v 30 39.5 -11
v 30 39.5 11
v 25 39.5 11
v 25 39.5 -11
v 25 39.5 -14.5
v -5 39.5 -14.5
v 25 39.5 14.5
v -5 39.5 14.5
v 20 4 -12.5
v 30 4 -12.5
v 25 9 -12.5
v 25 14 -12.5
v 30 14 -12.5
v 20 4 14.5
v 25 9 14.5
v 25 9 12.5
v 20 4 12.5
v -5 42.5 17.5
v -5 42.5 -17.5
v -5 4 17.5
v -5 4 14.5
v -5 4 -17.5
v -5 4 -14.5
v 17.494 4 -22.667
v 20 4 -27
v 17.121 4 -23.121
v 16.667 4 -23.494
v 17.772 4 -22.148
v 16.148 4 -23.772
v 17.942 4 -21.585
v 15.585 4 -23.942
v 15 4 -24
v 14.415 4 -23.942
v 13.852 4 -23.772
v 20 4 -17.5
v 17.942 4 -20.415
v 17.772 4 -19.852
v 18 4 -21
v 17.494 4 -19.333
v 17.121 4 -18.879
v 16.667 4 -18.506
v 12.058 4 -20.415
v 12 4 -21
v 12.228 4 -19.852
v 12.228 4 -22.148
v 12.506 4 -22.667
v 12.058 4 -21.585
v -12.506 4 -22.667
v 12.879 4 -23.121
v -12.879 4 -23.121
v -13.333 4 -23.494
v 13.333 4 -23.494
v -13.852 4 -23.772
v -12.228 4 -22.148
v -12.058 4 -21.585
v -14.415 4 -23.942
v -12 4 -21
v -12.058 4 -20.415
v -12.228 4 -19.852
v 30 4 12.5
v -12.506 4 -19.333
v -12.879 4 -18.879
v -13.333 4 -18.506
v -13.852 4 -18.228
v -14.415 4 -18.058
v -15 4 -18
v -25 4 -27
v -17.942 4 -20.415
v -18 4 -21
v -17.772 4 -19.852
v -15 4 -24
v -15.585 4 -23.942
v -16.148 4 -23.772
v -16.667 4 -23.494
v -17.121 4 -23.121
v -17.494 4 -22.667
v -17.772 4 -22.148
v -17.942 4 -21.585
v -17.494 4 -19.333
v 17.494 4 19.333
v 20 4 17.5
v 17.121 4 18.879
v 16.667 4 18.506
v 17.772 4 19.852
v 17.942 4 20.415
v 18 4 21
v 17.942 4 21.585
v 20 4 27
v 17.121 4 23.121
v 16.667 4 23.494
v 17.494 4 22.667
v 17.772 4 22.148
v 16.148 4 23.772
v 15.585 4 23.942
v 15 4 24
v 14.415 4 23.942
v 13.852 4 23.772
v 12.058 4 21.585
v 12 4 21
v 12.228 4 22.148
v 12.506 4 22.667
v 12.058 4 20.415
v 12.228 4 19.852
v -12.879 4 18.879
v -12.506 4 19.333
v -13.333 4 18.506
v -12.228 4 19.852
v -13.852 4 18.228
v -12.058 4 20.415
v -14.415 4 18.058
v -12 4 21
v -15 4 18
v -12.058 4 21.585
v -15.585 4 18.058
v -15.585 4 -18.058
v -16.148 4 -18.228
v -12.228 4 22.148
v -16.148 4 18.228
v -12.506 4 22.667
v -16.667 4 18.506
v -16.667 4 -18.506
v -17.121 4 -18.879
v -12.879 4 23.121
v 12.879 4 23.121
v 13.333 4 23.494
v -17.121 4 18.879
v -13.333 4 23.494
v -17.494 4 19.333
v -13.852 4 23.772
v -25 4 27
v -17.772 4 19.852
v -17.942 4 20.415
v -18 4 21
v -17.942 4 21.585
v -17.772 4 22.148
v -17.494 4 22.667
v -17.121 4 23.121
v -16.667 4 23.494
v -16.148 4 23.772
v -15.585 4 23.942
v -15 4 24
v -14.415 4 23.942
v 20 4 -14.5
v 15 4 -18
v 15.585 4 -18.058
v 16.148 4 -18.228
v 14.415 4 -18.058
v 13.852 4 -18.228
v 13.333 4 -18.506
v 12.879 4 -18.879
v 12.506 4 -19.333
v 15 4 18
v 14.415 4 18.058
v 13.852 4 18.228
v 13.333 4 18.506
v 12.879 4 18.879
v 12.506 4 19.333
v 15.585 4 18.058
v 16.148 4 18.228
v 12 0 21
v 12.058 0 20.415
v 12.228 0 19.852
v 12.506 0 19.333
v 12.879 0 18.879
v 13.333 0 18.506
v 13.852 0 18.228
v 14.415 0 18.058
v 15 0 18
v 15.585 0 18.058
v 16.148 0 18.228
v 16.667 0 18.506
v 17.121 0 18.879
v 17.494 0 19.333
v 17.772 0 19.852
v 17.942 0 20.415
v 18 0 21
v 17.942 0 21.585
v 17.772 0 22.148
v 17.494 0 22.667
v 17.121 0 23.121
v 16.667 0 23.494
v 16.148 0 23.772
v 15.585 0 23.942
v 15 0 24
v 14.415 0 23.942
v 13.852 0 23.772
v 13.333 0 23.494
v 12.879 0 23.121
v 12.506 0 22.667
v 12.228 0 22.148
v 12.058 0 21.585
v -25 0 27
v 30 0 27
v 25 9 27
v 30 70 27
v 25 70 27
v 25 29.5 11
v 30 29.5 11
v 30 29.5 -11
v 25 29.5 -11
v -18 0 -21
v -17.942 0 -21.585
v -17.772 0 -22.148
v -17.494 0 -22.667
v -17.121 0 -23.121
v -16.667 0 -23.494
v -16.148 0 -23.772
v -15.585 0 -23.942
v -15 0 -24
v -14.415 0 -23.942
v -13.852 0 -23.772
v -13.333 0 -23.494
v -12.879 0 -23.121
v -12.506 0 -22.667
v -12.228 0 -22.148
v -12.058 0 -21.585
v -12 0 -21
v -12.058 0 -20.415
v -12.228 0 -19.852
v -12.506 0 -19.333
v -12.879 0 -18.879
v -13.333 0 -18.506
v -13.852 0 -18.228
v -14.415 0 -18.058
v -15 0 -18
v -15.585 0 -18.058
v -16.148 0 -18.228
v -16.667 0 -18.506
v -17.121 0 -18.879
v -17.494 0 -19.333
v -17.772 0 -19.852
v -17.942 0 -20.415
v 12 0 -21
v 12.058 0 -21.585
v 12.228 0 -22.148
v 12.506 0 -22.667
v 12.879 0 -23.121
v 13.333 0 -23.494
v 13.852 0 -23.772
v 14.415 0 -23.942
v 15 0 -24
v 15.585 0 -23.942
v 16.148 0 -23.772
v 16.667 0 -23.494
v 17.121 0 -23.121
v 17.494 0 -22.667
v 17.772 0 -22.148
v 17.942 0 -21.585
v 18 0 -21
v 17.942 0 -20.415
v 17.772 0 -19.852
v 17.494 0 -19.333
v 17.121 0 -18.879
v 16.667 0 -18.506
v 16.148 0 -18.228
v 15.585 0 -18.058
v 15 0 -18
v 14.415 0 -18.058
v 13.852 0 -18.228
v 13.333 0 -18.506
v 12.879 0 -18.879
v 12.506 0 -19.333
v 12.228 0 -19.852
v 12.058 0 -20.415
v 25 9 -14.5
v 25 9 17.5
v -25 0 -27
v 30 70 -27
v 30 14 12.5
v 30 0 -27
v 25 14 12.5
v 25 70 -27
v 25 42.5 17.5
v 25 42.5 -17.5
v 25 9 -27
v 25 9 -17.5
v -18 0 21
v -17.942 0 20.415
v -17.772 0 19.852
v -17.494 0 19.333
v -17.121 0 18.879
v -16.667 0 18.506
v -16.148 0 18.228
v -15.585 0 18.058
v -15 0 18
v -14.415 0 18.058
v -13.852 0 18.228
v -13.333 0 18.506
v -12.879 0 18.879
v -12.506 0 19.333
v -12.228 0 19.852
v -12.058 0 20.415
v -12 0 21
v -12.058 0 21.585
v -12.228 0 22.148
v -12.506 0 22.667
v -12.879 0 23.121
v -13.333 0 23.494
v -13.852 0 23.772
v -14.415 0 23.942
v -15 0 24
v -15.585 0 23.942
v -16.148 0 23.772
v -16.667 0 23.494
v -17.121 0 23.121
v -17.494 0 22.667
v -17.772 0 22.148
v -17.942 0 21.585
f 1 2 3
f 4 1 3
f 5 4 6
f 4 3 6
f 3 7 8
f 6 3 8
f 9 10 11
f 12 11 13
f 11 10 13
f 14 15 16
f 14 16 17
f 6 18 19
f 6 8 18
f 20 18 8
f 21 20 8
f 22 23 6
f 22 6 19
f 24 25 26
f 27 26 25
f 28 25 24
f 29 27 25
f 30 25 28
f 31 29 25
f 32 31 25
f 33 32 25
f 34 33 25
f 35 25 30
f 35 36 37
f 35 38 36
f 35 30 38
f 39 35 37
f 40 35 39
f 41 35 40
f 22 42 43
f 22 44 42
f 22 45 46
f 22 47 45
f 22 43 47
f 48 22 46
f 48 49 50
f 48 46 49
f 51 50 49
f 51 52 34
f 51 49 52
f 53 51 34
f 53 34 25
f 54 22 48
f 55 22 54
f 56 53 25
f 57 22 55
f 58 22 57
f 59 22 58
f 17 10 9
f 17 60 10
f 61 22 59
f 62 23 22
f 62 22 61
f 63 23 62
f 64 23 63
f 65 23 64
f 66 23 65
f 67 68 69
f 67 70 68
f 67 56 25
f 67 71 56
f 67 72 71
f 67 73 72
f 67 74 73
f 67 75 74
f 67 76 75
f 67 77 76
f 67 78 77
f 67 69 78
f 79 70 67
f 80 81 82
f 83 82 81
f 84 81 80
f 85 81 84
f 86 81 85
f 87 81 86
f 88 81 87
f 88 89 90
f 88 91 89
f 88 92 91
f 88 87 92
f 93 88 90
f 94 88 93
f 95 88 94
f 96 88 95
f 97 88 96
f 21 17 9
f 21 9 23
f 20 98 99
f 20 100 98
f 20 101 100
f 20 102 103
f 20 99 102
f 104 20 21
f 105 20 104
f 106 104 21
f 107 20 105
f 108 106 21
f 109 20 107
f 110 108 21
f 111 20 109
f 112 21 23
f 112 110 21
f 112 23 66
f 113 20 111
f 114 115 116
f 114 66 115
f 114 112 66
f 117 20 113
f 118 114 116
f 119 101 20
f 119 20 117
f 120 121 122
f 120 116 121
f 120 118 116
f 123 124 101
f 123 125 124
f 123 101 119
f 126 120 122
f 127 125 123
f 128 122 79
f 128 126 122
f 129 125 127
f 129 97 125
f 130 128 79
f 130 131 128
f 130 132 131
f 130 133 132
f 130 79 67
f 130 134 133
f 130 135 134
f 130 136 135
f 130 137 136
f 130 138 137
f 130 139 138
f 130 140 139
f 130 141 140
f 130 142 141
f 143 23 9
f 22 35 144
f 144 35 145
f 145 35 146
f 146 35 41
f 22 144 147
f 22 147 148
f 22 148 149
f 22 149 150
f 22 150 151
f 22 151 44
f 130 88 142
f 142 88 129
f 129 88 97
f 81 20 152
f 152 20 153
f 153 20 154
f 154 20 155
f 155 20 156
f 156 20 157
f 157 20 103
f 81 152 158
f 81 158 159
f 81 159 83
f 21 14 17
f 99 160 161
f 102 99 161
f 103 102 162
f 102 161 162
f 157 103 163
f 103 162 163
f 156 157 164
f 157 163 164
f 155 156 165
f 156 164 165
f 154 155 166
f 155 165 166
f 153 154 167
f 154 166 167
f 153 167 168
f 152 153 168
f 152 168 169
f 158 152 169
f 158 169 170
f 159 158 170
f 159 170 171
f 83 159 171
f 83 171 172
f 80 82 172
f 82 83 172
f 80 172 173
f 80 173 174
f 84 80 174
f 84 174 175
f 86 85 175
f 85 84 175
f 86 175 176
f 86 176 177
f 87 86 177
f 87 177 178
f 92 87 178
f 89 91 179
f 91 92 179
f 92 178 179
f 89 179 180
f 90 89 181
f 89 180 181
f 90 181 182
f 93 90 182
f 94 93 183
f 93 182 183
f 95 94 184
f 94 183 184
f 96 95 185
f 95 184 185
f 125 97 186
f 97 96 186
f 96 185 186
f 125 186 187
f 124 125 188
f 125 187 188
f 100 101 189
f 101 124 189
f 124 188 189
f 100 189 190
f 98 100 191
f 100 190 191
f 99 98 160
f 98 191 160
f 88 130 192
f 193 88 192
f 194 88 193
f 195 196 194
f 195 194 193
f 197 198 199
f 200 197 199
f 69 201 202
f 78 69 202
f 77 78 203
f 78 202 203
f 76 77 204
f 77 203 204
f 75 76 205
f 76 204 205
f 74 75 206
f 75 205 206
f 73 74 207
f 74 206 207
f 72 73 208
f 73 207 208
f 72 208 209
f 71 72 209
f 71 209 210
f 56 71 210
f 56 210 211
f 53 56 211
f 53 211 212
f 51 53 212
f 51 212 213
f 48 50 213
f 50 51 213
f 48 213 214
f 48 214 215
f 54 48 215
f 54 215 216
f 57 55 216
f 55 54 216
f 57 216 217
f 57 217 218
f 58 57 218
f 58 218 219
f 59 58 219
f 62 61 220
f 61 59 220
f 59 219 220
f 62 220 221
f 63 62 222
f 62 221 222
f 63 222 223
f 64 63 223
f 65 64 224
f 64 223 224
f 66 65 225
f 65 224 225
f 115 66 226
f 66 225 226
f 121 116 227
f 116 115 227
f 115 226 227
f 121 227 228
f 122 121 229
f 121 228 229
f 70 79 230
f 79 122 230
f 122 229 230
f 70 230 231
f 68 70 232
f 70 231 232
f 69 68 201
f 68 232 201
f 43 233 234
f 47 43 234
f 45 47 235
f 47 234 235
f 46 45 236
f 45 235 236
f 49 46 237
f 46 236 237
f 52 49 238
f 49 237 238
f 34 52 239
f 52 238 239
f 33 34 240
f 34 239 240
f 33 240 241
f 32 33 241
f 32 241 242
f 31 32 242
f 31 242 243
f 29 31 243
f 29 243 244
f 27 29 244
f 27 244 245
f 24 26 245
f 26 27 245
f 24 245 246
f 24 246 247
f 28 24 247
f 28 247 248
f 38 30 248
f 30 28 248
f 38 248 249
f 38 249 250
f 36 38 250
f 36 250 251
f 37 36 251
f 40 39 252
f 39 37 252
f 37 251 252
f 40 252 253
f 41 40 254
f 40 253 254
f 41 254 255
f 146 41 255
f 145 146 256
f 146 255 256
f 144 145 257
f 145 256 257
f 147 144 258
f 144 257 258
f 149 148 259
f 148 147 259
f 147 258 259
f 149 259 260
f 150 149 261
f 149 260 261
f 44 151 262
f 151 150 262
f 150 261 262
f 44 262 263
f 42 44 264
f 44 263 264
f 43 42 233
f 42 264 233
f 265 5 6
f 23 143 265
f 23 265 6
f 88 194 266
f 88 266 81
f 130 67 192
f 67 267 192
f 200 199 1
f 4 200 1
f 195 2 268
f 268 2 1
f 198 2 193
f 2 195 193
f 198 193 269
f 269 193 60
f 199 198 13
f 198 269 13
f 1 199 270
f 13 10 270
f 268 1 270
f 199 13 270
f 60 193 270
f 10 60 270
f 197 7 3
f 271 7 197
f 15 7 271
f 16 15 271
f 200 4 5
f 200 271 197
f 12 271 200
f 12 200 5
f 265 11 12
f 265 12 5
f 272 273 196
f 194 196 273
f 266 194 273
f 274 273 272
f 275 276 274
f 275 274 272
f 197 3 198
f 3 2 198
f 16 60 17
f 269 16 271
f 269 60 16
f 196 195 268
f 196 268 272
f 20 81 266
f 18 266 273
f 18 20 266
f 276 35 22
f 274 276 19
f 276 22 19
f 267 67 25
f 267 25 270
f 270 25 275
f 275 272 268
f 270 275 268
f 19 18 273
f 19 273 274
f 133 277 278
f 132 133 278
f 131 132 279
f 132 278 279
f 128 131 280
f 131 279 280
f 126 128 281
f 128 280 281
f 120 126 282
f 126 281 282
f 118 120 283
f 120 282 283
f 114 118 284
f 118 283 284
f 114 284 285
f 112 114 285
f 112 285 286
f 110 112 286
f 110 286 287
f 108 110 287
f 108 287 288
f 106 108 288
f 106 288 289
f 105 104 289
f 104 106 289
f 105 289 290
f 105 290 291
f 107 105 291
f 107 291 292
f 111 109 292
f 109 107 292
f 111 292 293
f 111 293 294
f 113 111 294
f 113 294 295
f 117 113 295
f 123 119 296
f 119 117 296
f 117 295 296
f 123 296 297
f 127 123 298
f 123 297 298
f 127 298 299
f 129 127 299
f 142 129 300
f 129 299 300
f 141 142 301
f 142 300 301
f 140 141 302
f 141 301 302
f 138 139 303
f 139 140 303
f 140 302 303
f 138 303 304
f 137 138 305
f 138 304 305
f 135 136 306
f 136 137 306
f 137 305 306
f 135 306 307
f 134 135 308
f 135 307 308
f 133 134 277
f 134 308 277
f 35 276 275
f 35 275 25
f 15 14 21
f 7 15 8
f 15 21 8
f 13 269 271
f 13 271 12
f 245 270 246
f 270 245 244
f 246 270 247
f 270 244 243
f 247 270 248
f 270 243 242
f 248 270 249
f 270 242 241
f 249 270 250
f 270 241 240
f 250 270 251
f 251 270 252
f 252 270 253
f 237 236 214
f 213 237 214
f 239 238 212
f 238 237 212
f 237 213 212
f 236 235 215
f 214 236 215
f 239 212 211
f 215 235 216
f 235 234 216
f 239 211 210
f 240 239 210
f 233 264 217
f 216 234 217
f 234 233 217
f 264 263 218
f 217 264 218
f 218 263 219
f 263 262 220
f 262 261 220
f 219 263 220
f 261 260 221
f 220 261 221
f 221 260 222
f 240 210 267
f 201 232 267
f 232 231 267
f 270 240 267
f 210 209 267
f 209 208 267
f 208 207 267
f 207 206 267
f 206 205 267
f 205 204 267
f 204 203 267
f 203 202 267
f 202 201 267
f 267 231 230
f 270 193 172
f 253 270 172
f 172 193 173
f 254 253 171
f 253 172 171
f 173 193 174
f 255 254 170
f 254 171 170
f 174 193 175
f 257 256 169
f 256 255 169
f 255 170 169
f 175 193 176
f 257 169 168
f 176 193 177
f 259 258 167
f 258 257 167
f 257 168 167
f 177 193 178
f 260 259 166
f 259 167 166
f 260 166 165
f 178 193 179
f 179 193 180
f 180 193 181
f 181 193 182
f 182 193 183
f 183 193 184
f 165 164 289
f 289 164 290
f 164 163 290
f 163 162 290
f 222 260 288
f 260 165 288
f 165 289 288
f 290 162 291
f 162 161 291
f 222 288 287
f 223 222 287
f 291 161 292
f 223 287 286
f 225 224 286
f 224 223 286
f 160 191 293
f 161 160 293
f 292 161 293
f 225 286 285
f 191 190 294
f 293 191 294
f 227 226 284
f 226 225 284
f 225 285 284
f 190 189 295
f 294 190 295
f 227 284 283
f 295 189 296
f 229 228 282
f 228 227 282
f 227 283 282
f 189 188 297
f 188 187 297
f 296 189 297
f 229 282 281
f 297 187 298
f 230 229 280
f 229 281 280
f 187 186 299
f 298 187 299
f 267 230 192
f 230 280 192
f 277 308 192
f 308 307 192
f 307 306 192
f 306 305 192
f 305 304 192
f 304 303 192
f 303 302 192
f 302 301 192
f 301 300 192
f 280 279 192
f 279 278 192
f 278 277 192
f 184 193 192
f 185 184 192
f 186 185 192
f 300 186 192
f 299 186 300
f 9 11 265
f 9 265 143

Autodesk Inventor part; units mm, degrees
ref_plane "YZ Plane" through (0, 0, 0) normal (1, 0, 0) x (0, 1, 0)
ref_plane "XZ Plane" through (0, 0, 0) normal (0, 1, 0) x (-1, 0, 0)
ref_plane "XY Plane" through (0, 0, 0) normal (0, 0, 1) x (1, 0, 0)
sketch "Szkic1" plane through (0, 0, 0) normal (0, 1, 0) x (-1, 0, 0)
  line L0 (25, 27) -> (-25, 27)
  line L1 (-25, 27) -> (-25, -27)
  line L2 (-25, -27) -> (25, -27)
  line L3 (25, -27) -> (25, 27)
  line L4 (-25, 27) -> (25, -27) construction
  circle A0 centre (15, 21) radius 3
  line L5 (25, 0) -> (-25, 0)
  line L6 (0, 27) -> (0, -27)
  circle A1 centre (15, -21) radius 3
  circle A2 centre (-15, 21) radius 3
  circle A3 centre (-15, -21) radius 3
  line L7 (-25, 27) -> (-30, 27)
  line L8 (-30, 27) -> (-30, -27)
  line L9 (-30, -27) -> (-25, -27)
  line L10 (-25, -27) -> (-25, 27)
  line L11 (0, -14.5) -> (5, -14.5)
  line L12 (5, -14.5) -> (5, -17.5)
  line L13 (5, -17.5) -> (0, -17.5)
  line L14 (0, -17.5) -> (0, -14.5)
  line L15 (0, -14.5) -> (-5, -14.5)
  line L16 (-5, -14.5) -> (-5, -17.5)
  line L17 (-5, -17.5) -> (0, -17.5)
  line L18 (0, 14.5) -> (5, 14.5)
  line L19 (5, 14.5) -> (5, 17.5)
  line L20 (5, 17.5) -> (0, 17.5)
  line L21 (-5, 14.5) -> (-5, 17.5)
  line L22 (-5, 17.5) -> (0, 17.5)
  line L23 (0, 14.5) -> (-5, 14.5)
  line L24 (5, 14.5) -> (5, -14.5)
  line L25 (-5, 14.5) -> (-5, -14.5)
  point P0 (0, 0)
  point P1 (-27.5, 27)
  point P2 (-25, -27)
  point P3 (0, -17.5)
  point P4 (0, 17.5)
  dimension "d0" = 50
  dimension "d5" = 10
  dimension "d7" = 6
  dimension "d8" = 6
  dimension "d9" = 5
  dimension "d10" = 54
  dimension "d12" = 54
  dimension "d21" = 5
  dimension "d22" = 3
  dimension "d26" = 14.5
  dimension "d27" = 50
  dimension "d28" = 36.688
extrude "Wyciągnięcie proste1" add sketch "Szkic1" along normal blind 4 contours L3 L5 L24 L19 L20 L6 L0 | L6 L22 L21 L25 L5 L1 L0 | L3 L2 L6 L13 L12 L24 L5 | L20 L19 L18 L6 | L6 L23 L21 L22 | L24 L11 L6 L5 | L5 L6 L18 L24 | L5 L25 L16 L17 L6 L2 L1 | L6 L5 L25 L23 | L6 L15 L25 L5 | L12 L13 L6 L11 | L17 L16 L15 L6
extrude "Wyciągnięcie proste2" add sketch "Szkic1" along normal blind 70 contours L1 L9 L8 L7
sketch "Szkic3" plane through (-25, 0, 27) normal (0, 0, 1) x (1, 0, 0)
  line L0 (50, 4) -> (50, 70) projected
  line L1 (50, 9) -> (45, 4)
  line L2 (0, 4) -> (50, 4) projected
  line L3 (50, 9) -> (57.0711, 9) construction
  point P0 (25, 0)
  dimension "d17" = 135
  dimension "d18" = 5
extrude "Wyciągnięcie proste3" add sketch "Szkic3" against normal blind 54
extrude "Wyciągnięcie proste4" add sketch "Szkic1" along normal blind 42.5 contours L20 L19 L18 L6 | L12 L13 L6 L11
extrude "Wyciągnięcie proste5" add sketch "Szkic1" along normal blind 42.5 contours L24 L11 L6 L5 | L5 L6 L18 L24
extrude "Wyciągnięcie proste6" cut sketch "Szkic1" along normal blind 39.5 contours L24 L11 L6 L5 | L5 L6 L18 L24
extrude "Wyciągnięcie proste7" add sketch "Szkic1" along normal blind 4 contours L24 L11 L6 L5 | L5 L6 L18 L24
sketch "Szkic9" plane through (25, 70, -27) normal (-1, 0, 0) x (0, 0, 1)
  line L0 (0, -66) -> (54, -66) projected
  line L1 (39.5, -66) -> (39.5, -56)
  line L2 (41.5, -30.5) -> (12.5, -30.5) projected
  line L3 (41.5, -30.5) -> (41.5, -66) projected
  line L4 (27, -70) -> (27, 0)
  line L5 (0, 0) -> (54, 0) projected
  line L6 (14.5, -66) -> (14.5, -56)
  line L7 (39.5, -56) -> (14.5, -56)
  line L8 (39.5, -56) -> (14.5, -56)
  line L9 (14.5, -56) -> (14.5, -66)
  line L10 (14.5, -66) -> (39.5, -66)
  line L11 (39.5, -66) -> (39.5, -56)
  line L12 (39.5, -56) -> (39.5, -30.5)
  line L13 (14.5, -56) -> (14.5, -30.5)
  line L14 (39.5, -40.5) -> (14.5, -40.5)
  line L15 (38, -40.5) -> (16, -40.5)
  line L16 (16, -40.5) -> (16, -30.5)
  line L17 (16, -30.5) -> (38, -30.5)
  line L18 (38, -30.5) -> (38, -40.5)
  point P0 (38, -30.5)
  dimension "d37" = 10
  dimension "d38" = 2
  dimension "d39" = 10
  dimension "d40" = 22
  dimension "d41" = 1.5
extrude "Wyciągnięcie proste8" cut sketch "Szkic9" along normal mid plane 10 contours L0 L4 L7 L1 | L0 L6 L7 L4 | L14 L16 L2 L4 | L4 L2 L18 L14
sketch "Szkic10" plane through (0, 4, -17.5) normal (1, 0, 0) x (0, 0, -1)
  line L0 (-32, 0) -> (-32, 35.5) projected
  line L1 (-32, 35.5) -> (-3, 35.5) projected
  line L2 (-3, 35.5) -> (-3, 0) projected
  line L3 (0, 0) -> (-3, 0) projected
  line L4 (0, 0) -> (0, 38.5) projected
  line L5 (-35, 38.5) -> (0, 38.5) projected
  line L6 (-35, 0) -> (-35, 38.5) projected
  line L7 (-32, 0) -> (-35, 0) projected
  point P0 (-17.5, -4)
extrude "Wyciągnięcie proste9" add sketch "Szkic10" along normal up to surface (25 mm away)
properties part number "obudowa_łoż_pion_1" material "Tworzywo sztuczne ABS"
